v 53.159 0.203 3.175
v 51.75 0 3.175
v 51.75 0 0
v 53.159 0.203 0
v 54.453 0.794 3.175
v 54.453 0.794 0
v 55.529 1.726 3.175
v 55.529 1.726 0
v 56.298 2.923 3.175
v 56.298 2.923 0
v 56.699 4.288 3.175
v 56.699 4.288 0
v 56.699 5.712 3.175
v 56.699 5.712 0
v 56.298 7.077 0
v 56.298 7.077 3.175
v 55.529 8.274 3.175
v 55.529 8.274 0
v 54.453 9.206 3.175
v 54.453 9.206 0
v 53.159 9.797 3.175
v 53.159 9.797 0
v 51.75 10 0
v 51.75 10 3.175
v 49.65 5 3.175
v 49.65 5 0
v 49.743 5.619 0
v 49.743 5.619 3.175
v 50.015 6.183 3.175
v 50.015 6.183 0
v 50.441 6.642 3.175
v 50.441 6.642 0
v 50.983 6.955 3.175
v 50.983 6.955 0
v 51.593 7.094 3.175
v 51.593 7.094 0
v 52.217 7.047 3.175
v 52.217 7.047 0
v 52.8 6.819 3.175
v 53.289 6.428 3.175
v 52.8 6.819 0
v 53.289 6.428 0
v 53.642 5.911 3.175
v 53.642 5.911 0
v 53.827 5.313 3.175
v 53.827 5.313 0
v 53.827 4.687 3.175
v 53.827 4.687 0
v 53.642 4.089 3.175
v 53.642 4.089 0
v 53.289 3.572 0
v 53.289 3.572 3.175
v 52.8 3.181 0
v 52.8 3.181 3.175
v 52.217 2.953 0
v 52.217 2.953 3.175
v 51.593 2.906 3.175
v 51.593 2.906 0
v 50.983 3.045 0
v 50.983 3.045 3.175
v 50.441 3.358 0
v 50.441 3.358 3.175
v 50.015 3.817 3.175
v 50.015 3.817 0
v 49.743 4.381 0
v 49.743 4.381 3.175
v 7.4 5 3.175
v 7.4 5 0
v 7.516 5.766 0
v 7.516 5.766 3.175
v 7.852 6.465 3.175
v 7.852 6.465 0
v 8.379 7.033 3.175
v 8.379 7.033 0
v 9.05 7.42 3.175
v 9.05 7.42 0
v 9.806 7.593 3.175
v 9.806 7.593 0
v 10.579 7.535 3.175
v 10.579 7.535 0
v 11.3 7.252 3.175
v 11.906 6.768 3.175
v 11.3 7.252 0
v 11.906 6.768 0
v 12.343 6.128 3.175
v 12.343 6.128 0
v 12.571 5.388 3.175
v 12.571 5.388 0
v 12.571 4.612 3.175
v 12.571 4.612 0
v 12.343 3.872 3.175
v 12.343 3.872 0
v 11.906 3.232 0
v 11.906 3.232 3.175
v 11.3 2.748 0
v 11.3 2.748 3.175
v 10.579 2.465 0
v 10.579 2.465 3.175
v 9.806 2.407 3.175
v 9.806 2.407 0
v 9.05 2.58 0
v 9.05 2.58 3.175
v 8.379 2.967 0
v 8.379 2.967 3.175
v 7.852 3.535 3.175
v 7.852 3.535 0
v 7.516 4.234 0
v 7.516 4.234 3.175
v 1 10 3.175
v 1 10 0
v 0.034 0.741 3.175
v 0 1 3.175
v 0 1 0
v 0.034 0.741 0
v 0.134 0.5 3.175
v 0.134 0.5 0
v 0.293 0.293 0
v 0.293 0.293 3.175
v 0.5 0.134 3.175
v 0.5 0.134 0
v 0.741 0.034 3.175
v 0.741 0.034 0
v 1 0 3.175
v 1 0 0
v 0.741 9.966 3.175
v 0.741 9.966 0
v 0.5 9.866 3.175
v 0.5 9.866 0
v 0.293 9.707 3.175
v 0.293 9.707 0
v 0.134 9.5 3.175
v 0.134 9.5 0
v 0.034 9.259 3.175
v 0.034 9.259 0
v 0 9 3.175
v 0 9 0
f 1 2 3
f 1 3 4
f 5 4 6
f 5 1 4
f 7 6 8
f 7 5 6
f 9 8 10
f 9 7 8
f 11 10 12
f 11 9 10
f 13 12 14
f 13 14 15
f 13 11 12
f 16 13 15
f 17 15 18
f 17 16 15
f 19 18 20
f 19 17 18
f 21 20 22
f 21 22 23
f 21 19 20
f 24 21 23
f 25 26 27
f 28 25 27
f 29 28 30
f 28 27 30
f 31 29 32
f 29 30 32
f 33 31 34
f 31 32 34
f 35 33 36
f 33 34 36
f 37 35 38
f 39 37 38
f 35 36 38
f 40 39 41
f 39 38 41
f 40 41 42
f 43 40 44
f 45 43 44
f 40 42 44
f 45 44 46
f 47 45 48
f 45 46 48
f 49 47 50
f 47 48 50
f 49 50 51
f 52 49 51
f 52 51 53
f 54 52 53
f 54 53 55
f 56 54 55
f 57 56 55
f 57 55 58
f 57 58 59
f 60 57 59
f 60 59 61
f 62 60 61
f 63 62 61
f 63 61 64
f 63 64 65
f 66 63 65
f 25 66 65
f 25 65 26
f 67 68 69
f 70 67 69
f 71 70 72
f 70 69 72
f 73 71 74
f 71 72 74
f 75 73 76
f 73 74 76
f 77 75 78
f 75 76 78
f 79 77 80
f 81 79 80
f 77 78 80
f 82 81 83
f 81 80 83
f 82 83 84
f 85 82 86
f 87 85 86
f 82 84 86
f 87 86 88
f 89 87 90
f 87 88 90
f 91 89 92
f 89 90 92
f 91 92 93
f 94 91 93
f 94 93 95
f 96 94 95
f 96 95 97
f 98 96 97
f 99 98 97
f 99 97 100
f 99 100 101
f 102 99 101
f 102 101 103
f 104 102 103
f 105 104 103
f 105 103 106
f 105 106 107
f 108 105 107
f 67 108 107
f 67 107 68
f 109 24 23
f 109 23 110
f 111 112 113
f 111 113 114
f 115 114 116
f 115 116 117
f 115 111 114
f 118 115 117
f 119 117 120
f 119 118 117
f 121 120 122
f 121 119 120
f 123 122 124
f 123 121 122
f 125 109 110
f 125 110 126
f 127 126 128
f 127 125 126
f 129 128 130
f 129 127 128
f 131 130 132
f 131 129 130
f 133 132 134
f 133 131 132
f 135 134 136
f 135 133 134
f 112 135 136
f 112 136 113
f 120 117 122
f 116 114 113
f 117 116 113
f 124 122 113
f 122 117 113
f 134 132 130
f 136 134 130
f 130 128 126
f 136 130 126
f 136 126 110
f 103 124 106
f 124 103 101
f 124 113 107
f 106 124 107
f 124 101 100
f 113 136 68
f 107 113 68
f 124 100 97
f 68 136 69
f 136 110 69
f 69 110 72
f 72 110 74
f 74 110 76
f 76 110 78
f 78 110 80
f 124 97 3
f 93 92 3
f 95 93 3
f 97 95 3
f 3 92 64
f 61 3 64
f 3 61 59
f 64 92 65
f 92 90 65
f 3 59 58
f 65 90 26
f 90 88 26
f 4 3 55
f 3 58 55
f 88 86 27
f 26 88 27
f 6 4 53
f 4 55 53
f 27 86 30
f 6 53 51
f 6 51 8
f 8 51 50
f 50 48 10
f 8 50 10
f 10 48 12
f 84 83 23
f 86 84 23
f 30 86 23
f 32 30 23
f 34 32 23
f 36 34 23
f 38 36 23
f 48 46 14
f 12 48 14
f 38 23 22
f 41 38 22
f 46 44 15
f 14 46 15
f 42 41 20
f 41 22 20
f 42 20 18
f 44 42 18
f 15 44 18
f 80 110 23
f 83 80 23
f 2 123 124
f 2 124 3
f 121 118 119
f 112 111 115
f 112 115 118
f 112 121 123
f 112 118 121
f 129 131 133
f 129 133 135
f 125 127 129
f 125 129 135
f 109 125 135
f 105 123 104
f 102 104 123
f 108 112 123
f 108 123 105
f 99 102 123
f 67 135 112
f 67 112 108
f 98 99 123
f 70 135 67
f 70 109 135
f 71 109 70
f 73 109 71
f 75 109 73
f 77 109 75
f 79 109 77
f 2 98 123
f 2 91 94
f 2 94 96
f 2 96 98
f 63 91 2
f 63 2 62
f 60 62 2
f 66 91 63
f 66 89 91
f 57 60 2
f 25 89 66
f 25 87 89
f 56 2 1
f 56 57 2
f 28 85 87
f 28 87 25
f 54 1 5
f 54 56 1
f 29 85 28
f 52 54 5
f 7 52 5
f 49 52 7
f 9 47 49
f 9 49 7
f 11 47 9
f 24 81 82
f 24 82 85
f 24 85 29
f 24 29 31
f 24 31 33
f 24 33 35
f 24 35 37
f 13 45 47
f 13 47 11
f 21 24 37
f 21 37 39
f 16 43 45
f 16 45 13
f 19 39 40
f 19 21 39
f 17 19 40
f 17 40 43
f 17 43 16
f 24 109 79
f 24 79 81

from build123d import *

# Parameters (mm, degrees)
BOSS_EXTRUDE1_DEPTH        = 3.175
F_4_2_4_2_DIAMETER_HOLE1_D = 4.2
F_5_2_5_2_DIAMETER_HOLE1_D = 5.2


with BuildPart() as part:
    # Sketch1 → Boss-Extrude1 (new body)
    with BuildSketch(Plane.XY.offset(3.175)):
        with BuildLine():
            Line((0, 9), (0, 1))
            ThreePointArc((0, 1), (0.292893219, 0.292893219), (1, 0))
            Line((1, 0), (51.75, 0))
            ThreePointArc((51.75, 0), (56.75, 5), (51.75, 10))
            Line((51.75, 10), (1, 10))
            ThreePointArc((1, 10), (0.292893219, 9.707106781), (0, 9))
        make_face()
    extrude(amount=-BOSS_EXTRUDE1_DEPTH)

    # Ø4.2 (4.2) Diameter Hole1 (through all)
    with Locations(Plane.XY.offset(3.175)):
        with Locations((51.75, 5)):
            Hole(F_4_2_4_2_DIAMETER_HOLE1_D / 2)

    # Ø5.2 (5.2) Diameter Hole1 (through all)
    with Locations(Plane.XY.offset(3.175)):
        with Locations((10, 5)):
            Hole(F_5_2_5_2_DIAMETER_HOLE1_D / 2)


solid = part.part
